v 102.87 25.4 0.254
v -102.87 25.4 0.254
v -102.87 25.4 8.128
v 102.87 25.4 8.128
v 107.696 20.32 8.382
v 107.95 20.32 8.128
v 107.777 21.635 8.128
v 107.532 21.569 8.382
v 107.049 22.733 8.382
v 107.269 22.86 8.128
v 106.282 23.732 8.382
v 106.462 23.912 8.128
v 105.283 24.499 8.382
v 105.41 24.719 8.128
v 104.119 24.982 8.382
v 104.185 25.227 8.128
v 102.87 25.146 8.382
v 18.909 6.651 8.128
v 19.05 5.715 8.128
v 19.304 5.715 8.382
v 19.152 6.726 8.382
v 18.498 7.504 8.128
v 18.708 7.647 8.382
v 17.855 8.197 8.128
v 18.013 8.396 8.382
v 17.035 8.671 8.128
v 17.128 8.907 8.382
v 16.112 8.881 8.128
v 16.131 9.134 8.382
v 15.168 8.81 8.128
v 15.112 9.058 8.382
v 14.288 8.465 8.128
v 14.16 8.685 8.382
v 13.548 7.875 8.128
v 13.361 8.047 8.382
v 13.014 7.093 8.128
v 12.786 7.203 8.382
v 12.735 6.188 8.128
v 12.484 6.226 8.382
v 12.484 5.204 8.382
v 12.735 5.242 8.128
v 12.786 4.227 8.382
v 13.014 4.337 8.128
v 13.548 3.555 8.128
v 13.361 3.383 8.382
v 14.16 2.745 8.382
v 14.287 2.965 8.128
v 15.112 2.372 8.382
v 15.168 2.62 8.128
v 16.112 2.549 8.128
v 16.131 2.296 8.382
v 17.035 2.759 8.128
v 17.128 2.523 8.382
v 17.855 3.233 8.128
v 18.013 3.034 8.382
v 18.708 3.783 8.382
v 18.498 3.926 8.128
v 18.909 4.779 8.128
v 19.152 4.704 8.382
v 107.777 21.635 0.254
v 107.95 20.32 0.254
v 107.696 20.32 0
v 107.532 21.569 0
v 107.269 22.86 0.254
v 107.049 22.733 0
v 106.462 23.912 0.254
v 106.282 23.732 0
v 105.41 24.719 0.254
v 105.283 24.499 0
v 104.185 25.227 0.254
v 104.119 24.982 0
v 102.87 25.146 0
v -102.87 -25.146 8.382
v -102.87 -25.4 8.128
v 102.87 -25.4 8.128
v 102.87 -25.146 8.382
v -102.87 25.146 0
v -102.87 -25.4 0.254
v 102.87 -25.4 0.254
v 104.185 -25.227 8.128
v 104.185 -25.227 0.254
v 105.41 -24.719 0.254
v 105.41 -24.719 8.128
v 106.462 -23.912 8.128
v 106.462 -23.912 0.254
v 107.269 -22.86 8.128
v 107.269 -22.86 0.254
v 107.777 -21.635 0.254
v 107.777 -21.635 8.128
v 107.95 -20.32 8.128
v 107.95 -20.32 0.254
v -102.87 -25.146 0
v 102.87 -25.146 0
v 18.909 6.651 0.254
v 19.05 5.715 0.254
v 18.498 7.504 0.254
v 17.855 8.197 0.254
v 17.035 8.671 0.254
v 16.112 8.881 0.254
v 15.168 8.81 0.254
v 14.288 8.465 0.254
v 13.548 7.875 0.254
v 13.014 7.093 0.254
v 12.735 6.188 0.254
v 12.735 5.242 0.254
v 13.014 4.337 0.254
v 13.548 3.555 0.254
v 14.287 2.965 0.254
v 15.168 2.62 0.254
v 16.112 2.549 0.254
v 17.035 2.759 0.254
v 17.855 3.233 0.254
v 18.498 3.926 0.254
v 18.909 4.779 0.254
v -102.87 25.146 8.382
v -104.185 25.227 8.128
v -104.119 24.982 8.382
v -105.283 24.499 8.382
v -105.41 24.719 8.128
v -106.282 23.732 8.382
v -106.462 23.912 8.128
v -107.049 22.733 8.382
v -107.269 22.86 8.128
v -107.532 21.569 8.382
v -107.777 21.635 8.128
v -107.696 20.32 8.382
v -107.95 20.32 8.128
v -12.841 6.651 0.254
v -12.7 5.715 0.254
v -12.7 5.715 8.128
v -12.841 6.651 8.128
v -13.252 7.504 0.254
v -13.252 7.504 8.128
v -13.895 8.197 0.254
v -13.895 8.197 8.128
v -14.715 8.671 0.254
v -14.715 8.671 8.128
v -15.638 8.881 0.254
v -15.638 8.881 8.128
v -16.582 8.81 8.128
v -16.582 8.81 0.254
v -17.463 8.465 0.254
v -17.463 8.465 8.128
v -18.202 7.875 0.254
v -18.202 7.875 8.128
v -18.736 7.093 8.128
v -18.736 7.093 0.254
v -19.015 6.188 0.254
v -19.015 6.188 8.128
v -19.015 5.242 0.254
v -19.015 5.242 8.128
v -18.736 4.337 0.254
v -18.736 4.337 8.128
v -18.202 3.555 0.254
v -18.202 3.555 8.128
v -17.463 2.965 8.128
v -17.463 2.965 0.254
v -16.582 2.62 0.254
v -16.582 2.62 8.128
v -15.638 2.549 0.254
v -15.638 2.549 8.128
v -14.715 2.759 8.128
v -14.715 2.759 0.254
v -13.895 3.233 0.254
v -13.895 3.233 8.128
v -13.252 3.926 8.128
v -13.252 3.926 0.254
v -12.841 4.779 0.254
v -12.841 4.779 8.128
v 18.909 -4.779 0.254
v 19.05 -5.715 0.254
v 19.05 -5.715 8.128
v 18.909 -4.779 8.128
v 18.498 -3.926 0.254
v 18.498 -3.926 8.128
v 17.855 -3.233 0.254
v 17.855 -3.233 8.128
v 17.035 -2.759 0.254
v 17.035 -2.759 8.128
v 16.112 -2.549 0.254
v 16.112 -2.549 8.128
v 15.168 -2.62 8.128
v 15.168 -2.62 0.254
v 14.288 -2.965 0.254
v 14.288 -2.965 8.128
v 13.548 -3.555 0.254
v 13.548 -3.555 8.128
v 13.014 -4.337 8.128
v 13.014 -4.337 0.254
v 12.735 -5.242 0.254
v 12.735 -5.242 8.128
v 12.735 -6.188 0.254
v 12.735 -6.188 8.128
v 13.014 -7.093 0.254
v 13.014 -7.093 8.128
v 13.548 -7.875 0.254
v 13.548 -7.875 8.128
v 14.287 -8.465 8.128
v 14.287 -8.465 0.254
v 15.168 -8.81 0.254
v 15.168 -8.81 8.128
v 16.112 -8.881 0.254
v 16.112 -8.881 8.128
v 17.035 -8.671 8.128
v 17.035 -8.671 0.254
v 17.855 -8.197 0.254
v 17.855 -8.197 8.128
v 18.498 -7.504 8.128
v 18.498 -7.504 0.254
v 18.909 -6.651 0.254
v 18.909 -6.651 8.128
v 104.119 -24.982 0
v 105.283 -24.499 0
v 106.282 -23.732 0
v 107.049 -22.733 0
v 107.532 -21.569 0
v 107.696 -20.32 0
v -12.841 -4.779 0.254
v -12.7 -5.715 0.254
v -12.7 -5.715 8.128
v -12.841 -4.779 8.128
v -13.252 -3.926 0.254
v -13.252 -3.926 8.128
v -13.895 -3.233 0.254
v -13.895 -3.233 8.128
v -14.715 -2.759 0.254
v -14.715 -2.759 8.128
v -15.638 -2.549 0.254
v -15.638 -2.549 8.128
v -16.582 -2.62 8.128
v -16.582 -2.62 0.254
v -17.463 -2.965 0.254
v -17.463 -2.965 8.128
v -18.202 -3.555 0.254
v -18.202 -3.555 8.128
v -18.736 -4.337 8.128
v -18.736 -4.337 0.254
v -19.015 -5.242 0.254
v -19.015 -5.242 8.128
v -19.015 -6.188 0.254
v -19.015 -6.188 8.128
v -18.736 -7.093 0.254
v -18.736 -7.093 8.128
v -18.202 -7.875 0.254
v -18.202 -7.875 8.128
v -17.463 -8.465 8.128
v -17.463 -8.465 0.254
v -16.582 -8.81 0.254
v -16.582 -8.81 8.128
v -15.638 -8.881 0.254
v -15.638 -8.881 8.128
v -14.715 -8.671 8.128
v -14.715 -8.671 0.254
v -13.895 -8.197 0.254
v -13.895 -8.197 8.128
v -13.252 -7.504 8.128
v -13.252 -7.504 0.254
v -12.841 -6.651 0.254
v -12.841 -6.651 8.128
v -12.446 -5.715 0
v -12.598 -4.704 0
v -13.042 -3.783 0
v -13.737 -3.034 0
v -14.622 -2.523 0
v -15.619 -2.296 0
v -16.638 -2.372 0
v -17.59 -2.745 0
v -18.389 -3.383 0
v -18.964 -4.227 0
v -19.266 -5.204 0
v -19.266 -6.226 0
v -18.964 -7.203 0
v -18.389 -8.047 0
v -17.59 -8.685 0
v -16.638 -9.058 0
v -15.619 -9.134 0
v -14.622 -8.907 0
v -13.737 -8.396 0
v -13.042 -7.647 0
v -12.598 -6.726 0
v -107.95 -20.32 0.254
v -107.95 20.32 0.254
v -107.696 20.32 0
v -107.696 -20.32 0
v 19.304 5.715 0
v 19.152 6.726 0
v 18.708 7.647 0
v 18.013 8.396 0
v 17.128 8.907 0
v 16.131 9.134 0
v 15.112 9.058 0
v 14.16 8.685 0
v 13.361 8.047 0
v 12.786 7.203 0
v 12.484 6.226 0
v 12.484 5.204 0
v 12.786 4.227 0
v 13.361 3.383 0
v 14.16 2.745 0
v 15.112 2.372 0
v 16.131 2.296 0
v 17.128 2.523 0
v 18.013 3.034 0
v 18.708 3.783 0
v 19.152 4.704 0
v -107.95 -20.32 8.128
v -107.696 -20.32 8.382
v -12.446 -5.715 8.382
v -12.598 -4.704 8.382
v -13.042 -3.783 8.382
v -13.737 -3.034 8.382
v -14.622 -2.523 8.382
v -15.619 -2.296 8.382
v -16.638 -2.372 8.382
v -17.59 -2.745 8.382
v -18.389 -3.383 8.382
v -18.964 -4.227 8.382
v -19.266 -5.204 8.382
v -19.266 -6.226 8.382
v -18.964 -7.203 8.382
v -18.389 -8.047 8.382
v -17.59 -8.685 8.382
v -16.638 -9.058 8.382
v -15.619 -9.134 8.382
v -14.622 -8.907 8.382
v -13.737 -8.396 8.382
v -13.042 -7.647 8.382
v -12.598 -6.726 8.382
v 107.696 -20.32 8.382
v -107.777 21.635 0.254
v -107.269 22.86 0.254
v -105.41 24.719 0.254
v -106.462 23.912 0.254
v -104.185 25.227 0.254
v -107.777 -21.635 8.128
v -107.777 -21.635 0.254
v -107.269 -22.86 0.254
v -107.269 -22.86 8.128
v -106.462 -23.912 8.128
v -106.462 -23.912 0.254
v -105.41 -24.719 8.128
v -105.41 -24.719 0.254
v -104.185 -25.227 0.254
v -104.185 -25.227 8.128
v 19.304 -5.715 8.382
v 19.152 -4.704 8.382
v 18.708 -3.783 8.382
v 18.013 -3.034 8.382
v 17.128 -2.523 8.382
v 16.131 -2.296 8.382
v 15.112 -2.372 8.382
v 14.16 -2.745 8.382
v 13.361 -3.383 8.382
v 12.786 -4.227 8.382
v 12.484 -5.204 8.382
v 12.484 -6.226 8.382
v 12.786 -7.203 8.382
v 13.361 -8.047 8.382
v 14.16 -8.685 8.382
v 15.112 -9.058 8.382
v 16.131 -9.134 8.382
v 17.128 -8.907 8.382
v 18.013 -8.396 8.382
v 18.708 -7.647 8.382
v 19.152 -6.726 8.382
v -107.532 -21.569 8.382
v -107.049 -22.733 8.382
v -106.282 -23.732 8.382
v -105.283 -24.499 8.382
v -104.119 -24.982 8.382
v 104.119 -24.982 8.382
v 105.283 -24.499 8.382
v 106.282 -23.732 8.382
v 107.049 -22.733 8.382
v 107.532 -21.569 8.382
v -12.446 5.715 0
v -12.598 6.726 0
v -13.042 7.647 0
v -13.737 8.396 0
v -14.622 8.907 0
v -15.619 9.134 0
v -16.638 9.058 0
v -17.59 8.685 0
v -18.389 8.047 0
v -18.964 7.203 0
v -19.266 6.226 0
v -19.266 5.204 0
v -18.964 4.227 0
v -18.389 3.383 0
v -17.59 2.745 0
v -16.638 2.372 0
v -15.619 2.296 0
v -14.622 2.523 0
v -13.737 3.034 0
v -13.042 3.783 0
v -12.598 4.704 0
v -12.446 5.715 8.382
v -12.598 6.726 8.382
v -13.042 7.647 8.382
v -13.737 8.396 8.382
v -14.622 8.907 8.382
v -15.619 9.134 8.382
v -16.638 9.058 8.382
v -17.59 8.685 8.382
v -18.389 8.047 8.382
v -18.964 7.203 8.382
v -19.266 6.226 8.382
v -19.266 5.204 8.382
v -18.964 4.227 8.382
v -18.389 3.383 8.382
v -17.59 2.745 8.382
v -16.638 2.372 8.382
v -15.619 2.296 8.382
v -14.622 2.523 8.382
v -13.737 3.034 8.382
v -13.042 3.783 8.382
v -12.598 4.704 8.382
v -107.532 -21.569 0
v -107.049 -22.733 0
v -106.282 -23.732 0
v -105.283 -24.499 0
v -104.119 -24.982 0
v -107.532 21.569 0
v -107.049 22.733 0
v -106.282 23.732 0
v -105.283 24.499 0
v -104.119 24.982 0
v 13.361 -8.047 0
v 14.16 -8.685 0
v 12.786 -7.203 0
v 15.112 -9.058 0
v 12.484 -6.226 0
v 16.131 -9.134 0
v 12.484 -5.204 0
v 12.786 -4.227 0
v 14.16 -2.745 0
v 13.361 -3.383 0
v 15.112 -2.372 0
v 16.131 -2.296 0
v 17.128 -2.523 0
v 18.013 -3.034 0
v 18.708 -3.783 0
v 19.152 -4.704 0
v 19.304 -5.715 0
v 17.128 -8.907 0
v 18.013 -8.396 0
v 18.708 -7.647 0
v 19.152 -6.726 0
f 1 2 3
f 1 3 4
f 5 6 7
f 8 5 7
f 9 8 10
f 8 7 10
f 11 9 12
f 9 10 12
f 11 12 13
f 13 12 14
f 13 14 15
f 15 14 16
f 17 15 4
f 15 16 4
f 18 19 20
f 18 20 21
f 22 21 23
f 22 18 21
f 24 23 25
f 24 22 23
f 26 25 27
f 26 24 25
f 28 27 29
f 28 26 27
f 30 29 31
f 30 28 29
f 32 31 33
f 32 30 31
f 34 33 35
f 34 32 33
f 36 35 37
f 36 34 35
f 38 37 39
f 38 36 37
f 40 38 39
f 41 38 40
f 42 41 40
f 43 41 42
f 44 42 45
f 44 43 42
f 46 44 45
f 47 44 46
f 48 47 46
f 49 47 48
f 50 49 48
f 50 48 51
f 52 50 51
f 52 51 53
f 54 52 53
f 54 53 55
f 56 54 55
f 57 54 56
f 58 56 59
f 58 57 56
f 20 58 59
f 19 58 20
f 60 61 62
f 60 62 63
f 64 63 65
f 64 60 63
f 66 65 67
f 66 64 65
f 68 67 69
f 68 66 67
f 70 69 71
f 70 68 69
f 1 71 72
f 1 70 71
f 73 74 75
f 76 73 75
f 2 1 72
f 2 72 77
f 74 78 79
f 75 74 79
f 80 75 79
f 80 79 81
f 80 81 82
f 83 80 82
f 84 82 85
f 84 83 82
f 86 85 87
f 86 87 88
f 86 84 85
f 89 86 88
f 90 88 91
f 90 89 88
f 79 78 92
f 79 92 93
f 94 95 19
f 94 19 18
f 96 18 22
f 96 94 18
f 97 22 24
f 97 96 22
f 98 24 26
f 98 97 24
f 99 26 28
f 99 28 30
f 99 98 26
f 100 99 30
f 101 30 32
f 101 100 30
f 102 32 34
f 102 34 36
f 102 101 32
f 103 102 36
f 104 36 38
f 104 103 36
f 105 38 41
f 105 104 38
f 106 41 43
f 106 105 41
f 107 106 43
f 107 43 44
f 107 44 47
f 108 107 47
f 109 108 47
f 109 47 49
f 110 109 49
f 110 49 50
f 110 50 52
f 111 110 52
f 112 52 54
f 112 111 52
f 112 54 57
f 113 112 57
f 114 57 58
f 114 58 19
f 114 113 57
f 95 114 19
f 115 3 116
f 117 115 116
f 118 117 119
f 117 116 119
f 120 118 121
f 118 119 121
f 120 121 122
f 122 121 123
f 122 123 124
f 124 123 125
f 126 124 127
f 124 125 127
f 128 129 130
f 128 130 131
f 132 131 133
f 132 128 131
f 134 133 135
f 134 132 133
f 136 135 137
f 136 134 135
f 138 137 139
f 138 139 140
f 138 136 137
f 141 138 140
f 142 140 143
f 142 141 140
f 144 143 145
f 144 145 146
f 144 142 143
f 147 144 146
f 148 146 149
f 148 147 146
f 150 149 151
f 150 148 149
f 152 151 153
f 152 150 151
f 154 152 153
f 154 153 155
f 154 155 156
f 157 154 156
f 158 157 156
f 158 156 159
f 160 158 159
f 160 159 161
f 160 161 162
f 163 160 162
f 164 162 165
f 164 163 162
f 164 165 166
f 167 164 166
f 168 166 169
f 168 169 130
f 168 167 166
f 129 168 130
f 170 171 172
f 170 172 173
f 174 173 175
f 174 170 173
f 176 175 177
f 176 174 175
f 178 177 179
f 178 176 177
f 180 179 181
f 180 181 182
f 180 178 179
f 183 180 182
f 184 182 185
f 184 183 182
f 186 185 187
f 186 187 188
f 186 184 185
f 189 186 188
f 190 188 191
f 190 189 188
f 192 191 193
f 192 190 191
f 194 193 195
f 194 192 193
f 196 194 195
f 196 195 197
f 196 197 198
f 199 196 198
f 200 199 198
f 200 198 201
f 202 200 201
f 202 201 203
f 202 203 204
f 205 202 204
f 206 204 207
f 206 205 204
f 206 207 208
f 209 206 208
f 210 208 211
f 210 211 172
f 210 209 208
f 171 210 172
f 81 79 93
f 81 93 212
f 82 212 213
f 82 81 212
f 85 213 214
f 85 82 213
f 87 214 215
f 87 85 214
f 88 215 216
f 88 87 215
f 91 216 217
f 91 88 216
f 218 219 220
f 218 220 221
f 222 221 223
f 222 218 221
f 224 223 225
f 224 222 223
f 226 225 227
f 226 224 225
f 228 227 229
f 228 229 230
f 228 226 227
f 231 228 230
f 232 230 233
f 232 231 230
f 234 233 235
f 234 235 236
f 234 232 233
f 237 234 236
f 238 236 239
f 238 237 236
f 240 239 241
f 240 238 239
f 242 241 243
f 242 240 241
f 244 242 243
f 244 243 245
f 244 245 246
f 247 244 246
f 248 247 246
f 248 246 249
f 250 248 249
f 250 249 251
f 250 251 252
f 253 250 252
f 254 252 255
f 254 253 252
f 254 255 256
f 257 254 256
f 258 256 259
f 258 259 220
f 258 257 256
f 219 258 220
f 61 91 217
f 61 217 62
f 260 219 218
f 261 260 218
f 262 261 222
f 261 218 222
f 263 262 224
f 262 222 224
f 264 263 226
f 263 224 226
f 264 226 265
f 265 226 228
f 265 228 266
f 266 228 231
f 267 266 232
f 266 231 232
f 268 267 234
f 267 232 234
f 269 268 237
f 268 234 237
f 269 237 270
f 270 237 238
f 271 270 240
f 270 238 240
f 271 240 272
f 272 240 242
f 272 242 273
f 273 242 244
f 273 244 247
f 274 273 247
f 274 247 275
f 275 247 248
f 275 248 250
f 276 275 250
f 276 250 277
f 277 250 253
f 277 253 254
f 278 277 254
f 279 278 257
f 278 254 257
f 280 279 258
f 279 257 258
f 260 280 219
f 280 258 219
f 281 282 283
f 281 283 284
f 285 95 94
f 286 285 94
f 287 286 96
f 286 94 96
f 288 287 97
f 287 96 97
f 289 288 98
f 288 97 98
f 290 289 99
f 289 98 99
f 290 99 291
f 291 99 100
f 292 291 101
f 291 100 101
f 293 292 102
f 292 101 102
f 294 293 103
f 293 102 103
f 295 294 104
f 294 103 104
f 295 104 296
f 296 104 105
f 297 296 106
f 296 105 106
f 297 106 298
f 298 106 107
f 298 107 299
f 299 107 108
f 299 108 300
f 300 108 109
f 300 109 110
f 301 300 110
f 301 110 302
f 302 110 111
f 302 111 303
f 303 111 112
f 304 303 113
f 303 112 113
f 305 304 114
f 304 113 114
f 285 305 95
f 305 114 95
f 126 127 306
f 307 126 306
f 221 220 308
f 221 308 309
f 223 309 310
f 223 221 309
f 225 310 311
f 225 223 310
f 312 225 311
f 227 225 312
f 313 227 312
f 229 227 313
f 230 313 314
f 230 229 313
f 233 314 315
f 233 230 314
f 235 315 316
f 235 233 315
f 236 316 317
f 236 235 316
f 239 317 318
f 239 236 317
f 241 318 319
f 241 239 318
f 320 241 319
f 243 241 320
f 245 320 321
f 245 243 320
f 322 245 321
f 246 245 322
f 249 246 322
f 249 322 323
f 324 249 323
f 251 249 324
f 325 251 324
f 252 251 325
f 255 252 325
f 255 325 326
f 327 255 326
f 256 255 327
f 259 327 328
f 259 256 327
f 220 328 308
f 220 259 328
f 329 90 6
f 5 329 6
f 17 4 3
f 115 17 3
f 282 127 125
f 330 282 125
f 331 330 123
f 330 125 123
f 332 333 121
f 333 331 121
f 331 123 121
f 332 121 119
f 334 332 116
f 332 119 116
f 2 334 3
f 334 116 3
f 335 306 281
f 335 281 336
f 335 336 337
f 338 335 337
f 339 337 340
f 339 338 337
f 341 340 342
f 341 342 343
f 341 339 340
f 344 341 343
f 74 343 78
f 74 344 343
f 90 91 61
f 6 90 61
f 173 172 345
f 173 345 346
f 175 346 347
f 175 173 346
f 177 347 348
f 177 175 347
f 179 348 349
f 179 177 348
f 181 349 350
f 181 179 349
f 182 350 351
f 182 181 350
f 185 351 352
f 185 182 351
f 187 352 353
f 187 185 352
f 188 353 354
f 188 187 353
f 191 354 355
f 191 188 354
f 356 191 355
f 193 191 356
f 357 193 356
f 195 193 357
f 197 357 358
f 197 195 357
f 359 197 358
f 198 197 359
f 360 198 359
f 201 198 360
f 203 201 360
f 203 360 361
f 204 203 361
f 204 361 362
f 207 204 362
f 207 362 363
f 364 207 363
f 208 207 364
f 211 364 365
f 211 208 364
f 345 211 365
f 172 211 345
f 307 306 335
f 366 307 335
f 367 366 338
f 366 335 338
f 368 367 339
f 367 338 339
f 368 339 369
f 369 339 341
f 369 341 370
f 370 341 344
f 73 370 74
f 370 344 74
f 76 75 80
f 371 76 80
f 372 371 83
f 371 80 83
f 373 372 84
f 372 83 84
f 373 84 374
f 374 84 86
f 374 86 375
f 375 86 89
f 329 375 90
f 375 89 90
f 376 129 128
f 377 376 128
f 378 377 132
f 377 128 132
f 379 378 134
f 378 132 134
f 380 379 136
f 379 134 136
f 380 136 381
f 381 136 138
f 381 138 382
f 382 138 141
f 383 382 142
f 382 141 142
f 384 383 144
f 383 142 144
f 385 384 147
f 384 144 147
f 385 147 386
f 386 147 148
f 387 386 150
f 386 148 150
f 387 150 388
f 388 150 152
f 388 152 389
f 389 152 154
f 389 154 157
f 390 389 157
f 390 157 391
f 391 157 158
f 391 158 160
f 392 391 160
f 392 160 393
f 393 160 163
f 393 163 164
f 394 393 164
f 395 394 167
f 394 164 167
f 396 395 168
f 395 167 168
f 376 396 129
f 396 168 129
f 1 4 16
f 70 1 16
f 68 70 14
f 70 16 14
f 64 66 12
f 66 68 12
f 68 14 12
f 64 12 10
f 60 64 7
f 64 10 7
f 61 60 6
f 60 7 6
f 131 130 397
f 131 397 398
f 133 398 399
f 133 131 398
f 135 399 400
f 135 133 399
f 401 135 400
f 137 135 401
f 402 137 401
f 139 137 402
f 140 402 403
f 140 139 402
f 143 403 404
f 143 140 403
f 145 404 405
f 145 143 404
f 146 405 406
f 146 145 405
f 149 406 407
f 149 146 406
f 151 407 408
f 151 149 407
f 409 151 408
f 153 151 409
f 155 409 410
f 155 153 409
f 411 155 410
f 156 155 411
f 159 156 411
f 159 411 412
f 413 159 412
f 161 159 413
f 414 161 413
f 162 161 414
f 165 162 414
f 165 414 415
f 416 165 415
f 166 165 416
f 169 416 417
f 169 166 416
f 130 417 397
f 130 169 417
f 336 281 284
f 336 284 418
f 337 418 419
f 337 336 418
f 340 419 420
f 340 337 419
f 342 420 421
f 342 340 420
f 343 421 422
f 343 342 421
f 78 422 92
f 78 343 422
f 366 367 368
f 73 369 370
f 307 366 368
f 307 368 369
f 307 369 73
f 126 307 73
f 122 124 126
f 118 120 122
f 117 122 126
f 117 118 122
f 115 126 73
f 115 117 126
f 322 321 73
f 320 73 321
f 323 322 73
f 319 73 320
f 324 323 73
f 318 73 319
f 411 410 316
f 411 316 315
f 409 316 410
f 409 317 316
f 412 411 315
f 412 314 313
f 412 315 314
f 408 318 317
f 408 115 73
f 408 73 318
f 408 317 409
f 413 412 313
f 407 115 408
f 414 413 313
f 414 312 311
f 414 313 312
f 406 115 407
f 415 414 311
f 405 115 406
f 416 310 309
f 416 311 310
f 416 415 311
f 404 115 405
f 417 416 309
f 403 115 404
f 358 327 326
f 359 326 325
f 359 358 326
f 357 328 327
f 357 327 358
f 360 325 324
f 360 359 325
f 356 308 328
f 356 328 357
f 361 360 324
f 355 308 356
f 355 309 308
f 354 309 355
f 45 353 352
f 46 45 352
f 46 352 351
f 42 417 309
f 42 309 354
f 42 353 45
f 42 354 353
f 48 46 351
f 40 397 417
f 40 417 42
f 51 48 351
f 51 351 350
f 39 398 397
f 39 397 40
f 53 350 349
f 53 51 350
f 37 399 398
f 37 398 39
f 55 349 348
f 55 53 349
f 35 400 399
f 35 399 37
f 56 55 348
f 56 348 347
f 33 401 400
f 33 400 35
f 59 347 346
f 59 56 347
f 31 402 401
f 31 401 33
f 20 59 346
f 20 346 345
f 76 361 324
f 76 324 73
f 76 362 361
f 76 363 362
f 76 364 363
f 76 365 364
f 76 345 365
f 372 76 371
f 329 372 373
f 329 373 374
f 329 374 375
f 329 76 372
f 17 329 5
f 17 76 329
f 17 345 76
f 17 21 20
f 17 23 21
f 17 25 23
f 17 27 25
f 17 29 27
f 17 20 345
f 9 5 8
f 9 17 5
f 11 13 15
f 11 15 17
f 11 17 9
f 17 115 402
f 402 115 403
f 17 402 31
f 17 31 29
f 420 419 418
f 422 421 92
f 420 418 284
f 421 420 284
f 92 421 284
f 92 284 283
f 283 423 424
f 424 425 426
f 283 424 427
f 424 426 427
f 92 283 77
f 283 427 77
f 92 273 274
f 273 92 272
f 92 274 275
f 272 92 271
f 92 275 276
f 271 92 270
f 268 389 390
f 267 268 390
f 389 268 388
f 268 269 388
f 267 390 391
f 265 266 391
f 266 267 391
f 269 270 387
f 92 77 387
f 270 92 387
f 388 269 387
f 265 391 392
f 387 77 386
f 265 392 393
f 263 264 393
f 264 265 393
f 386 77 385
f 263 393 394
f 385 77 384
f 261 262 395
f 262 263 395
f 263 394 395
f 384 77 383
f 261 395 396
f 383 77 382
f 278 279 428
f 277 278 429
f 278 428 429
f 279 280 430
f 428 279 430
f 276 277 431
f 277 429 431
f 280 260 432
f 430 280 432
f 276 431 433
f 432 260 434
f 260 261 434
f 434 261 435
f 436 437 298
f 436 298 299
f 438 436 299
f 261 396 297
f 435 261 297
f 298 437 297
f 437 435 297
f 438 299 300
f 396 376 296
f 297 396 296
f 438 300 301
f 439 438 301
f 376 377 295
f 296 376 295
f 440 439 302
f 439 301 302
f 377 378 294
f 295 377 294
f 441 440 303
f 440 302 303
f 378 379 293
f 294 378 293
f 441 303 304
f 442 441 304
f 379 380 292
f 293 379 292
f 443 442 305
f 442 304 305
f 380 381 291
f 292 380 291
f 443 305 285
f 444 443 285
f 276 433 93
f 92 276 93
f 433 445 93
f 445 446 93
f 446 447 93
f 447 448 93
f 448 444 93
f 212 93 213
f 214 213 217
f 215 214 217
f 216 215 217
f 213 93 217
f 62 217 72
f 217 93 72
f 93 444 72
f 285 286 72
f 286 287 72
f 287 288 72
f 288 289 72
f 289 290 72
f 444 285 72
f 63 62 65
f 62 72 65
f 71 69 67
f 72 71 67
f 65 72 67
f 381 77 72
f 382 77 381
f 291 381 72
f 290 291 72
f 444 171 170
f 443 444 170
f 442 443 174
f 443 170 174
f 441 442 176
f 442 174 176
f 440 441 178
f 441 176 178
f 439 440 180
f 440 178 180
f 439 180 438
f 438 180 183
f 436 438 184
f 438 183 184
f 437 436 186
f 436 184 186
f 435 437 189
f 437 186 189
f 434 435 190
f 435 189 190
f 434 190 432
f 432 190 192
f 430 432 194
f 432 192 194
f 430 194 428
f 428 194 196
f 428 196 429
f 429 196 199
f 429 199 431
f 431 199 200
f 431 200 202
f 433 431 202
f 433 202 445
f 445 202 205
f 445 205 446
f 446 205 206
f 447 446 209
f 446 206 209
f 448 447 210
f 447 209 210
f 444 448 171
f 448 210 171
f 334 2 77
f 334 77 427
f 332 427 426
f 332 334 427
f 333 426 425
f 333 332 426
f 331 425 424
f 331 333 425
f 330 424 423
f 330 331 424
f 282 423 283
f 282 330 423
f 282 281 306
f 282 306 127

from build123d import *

# Parameters (mm, degrees)
SKETCH1_W           = 215.9
SKETCH1_H           = 50.8
SKETCH1_R           = 3.175
BOSS_EXTRUDE1_DEPTH = 8.382
FILLET1_R           = 5.08
CHAMFER1_SIZE       = 0.254


with BuildPart() as part:
    # Sketch1 → Boss-Extrude1 (new body)
    with BuildSketch(Plane.XY):
        Rectangle(SKETCH1_W, SKETCH1_H)
        with Locations((-15.875, 5.715)):
            Circle(SKETCH1_R, mode=Mode.SUBTRACT)
        with Locations((15.875, 5.715)):
            Circle(SKETCH1_R, mode=Mode.SUBTRACT)
        with Locations((15.875, -5.715)):
            Circle(SKETCH1_R, mode=Mode.SUBTRACT)
        with Locations((-15.875, -5.715)):
            Circle(SKETCH1_R, mode=Mode.SUBTRACT)
    extrude(amount=BOSS_EXTRUDE1_DEPTH)

    # Fillet1
    fillet1_edges = [part.edges().sort_by_distance(p)[0] for p in [
        (-107.95, 25.4, 4.191),
        (107.95, 25.4, 4.191),
        (107.95, -25.4, 4.191),
        (-107.95, -25.4, 4.191),
    ]]
    fillet(fillet1_edges, radius=FILLET1_R)

    # Chamfer1
    chamfer1_edges = [part.edges().sort_by_distance(p)[0] for p in [
        (-19.05, 5.715, 0),
        (-19.05, 5.715, 8.382),
        (12.7, 5.715, 0),
        (12.7, 5.715, 8.382),
        (12.7, -5.715, 0),
        (12.7, -5.715, 8.382),
        (-19.05, -5.715, 0),
        (-19.05, -5.715, 8.382),
        (0, -25.4, 0),
        (0, -25.4, 8.382),
        (-107.95, 0, 0),
        (0, 25.4, 0),
        (107.95, 0, 0),
        (-106.462102448, 23.912102448, 0),
        (106.462102448, 23.912102448, 0),
        (106.462102448, -23.912102448, 0),
        (-106.462102448, -23.912102448, 0),
        (-107.95, 0, 8.382),
        (107.95, 0, 8.382),
        (0, 25.4, 8.382),
        (-106.462102448, 23.912102448, 8.382),
        (106.462102448, 23.912102448, 8.382),
        (106.462102448, -23.912102448, 8.382),
        (-106.462102448, -23.912102448, 8.382),
    ]]
    chamfer(chamfer1_edges, length=CHAMFER1_SIZE)


solid = part.part
